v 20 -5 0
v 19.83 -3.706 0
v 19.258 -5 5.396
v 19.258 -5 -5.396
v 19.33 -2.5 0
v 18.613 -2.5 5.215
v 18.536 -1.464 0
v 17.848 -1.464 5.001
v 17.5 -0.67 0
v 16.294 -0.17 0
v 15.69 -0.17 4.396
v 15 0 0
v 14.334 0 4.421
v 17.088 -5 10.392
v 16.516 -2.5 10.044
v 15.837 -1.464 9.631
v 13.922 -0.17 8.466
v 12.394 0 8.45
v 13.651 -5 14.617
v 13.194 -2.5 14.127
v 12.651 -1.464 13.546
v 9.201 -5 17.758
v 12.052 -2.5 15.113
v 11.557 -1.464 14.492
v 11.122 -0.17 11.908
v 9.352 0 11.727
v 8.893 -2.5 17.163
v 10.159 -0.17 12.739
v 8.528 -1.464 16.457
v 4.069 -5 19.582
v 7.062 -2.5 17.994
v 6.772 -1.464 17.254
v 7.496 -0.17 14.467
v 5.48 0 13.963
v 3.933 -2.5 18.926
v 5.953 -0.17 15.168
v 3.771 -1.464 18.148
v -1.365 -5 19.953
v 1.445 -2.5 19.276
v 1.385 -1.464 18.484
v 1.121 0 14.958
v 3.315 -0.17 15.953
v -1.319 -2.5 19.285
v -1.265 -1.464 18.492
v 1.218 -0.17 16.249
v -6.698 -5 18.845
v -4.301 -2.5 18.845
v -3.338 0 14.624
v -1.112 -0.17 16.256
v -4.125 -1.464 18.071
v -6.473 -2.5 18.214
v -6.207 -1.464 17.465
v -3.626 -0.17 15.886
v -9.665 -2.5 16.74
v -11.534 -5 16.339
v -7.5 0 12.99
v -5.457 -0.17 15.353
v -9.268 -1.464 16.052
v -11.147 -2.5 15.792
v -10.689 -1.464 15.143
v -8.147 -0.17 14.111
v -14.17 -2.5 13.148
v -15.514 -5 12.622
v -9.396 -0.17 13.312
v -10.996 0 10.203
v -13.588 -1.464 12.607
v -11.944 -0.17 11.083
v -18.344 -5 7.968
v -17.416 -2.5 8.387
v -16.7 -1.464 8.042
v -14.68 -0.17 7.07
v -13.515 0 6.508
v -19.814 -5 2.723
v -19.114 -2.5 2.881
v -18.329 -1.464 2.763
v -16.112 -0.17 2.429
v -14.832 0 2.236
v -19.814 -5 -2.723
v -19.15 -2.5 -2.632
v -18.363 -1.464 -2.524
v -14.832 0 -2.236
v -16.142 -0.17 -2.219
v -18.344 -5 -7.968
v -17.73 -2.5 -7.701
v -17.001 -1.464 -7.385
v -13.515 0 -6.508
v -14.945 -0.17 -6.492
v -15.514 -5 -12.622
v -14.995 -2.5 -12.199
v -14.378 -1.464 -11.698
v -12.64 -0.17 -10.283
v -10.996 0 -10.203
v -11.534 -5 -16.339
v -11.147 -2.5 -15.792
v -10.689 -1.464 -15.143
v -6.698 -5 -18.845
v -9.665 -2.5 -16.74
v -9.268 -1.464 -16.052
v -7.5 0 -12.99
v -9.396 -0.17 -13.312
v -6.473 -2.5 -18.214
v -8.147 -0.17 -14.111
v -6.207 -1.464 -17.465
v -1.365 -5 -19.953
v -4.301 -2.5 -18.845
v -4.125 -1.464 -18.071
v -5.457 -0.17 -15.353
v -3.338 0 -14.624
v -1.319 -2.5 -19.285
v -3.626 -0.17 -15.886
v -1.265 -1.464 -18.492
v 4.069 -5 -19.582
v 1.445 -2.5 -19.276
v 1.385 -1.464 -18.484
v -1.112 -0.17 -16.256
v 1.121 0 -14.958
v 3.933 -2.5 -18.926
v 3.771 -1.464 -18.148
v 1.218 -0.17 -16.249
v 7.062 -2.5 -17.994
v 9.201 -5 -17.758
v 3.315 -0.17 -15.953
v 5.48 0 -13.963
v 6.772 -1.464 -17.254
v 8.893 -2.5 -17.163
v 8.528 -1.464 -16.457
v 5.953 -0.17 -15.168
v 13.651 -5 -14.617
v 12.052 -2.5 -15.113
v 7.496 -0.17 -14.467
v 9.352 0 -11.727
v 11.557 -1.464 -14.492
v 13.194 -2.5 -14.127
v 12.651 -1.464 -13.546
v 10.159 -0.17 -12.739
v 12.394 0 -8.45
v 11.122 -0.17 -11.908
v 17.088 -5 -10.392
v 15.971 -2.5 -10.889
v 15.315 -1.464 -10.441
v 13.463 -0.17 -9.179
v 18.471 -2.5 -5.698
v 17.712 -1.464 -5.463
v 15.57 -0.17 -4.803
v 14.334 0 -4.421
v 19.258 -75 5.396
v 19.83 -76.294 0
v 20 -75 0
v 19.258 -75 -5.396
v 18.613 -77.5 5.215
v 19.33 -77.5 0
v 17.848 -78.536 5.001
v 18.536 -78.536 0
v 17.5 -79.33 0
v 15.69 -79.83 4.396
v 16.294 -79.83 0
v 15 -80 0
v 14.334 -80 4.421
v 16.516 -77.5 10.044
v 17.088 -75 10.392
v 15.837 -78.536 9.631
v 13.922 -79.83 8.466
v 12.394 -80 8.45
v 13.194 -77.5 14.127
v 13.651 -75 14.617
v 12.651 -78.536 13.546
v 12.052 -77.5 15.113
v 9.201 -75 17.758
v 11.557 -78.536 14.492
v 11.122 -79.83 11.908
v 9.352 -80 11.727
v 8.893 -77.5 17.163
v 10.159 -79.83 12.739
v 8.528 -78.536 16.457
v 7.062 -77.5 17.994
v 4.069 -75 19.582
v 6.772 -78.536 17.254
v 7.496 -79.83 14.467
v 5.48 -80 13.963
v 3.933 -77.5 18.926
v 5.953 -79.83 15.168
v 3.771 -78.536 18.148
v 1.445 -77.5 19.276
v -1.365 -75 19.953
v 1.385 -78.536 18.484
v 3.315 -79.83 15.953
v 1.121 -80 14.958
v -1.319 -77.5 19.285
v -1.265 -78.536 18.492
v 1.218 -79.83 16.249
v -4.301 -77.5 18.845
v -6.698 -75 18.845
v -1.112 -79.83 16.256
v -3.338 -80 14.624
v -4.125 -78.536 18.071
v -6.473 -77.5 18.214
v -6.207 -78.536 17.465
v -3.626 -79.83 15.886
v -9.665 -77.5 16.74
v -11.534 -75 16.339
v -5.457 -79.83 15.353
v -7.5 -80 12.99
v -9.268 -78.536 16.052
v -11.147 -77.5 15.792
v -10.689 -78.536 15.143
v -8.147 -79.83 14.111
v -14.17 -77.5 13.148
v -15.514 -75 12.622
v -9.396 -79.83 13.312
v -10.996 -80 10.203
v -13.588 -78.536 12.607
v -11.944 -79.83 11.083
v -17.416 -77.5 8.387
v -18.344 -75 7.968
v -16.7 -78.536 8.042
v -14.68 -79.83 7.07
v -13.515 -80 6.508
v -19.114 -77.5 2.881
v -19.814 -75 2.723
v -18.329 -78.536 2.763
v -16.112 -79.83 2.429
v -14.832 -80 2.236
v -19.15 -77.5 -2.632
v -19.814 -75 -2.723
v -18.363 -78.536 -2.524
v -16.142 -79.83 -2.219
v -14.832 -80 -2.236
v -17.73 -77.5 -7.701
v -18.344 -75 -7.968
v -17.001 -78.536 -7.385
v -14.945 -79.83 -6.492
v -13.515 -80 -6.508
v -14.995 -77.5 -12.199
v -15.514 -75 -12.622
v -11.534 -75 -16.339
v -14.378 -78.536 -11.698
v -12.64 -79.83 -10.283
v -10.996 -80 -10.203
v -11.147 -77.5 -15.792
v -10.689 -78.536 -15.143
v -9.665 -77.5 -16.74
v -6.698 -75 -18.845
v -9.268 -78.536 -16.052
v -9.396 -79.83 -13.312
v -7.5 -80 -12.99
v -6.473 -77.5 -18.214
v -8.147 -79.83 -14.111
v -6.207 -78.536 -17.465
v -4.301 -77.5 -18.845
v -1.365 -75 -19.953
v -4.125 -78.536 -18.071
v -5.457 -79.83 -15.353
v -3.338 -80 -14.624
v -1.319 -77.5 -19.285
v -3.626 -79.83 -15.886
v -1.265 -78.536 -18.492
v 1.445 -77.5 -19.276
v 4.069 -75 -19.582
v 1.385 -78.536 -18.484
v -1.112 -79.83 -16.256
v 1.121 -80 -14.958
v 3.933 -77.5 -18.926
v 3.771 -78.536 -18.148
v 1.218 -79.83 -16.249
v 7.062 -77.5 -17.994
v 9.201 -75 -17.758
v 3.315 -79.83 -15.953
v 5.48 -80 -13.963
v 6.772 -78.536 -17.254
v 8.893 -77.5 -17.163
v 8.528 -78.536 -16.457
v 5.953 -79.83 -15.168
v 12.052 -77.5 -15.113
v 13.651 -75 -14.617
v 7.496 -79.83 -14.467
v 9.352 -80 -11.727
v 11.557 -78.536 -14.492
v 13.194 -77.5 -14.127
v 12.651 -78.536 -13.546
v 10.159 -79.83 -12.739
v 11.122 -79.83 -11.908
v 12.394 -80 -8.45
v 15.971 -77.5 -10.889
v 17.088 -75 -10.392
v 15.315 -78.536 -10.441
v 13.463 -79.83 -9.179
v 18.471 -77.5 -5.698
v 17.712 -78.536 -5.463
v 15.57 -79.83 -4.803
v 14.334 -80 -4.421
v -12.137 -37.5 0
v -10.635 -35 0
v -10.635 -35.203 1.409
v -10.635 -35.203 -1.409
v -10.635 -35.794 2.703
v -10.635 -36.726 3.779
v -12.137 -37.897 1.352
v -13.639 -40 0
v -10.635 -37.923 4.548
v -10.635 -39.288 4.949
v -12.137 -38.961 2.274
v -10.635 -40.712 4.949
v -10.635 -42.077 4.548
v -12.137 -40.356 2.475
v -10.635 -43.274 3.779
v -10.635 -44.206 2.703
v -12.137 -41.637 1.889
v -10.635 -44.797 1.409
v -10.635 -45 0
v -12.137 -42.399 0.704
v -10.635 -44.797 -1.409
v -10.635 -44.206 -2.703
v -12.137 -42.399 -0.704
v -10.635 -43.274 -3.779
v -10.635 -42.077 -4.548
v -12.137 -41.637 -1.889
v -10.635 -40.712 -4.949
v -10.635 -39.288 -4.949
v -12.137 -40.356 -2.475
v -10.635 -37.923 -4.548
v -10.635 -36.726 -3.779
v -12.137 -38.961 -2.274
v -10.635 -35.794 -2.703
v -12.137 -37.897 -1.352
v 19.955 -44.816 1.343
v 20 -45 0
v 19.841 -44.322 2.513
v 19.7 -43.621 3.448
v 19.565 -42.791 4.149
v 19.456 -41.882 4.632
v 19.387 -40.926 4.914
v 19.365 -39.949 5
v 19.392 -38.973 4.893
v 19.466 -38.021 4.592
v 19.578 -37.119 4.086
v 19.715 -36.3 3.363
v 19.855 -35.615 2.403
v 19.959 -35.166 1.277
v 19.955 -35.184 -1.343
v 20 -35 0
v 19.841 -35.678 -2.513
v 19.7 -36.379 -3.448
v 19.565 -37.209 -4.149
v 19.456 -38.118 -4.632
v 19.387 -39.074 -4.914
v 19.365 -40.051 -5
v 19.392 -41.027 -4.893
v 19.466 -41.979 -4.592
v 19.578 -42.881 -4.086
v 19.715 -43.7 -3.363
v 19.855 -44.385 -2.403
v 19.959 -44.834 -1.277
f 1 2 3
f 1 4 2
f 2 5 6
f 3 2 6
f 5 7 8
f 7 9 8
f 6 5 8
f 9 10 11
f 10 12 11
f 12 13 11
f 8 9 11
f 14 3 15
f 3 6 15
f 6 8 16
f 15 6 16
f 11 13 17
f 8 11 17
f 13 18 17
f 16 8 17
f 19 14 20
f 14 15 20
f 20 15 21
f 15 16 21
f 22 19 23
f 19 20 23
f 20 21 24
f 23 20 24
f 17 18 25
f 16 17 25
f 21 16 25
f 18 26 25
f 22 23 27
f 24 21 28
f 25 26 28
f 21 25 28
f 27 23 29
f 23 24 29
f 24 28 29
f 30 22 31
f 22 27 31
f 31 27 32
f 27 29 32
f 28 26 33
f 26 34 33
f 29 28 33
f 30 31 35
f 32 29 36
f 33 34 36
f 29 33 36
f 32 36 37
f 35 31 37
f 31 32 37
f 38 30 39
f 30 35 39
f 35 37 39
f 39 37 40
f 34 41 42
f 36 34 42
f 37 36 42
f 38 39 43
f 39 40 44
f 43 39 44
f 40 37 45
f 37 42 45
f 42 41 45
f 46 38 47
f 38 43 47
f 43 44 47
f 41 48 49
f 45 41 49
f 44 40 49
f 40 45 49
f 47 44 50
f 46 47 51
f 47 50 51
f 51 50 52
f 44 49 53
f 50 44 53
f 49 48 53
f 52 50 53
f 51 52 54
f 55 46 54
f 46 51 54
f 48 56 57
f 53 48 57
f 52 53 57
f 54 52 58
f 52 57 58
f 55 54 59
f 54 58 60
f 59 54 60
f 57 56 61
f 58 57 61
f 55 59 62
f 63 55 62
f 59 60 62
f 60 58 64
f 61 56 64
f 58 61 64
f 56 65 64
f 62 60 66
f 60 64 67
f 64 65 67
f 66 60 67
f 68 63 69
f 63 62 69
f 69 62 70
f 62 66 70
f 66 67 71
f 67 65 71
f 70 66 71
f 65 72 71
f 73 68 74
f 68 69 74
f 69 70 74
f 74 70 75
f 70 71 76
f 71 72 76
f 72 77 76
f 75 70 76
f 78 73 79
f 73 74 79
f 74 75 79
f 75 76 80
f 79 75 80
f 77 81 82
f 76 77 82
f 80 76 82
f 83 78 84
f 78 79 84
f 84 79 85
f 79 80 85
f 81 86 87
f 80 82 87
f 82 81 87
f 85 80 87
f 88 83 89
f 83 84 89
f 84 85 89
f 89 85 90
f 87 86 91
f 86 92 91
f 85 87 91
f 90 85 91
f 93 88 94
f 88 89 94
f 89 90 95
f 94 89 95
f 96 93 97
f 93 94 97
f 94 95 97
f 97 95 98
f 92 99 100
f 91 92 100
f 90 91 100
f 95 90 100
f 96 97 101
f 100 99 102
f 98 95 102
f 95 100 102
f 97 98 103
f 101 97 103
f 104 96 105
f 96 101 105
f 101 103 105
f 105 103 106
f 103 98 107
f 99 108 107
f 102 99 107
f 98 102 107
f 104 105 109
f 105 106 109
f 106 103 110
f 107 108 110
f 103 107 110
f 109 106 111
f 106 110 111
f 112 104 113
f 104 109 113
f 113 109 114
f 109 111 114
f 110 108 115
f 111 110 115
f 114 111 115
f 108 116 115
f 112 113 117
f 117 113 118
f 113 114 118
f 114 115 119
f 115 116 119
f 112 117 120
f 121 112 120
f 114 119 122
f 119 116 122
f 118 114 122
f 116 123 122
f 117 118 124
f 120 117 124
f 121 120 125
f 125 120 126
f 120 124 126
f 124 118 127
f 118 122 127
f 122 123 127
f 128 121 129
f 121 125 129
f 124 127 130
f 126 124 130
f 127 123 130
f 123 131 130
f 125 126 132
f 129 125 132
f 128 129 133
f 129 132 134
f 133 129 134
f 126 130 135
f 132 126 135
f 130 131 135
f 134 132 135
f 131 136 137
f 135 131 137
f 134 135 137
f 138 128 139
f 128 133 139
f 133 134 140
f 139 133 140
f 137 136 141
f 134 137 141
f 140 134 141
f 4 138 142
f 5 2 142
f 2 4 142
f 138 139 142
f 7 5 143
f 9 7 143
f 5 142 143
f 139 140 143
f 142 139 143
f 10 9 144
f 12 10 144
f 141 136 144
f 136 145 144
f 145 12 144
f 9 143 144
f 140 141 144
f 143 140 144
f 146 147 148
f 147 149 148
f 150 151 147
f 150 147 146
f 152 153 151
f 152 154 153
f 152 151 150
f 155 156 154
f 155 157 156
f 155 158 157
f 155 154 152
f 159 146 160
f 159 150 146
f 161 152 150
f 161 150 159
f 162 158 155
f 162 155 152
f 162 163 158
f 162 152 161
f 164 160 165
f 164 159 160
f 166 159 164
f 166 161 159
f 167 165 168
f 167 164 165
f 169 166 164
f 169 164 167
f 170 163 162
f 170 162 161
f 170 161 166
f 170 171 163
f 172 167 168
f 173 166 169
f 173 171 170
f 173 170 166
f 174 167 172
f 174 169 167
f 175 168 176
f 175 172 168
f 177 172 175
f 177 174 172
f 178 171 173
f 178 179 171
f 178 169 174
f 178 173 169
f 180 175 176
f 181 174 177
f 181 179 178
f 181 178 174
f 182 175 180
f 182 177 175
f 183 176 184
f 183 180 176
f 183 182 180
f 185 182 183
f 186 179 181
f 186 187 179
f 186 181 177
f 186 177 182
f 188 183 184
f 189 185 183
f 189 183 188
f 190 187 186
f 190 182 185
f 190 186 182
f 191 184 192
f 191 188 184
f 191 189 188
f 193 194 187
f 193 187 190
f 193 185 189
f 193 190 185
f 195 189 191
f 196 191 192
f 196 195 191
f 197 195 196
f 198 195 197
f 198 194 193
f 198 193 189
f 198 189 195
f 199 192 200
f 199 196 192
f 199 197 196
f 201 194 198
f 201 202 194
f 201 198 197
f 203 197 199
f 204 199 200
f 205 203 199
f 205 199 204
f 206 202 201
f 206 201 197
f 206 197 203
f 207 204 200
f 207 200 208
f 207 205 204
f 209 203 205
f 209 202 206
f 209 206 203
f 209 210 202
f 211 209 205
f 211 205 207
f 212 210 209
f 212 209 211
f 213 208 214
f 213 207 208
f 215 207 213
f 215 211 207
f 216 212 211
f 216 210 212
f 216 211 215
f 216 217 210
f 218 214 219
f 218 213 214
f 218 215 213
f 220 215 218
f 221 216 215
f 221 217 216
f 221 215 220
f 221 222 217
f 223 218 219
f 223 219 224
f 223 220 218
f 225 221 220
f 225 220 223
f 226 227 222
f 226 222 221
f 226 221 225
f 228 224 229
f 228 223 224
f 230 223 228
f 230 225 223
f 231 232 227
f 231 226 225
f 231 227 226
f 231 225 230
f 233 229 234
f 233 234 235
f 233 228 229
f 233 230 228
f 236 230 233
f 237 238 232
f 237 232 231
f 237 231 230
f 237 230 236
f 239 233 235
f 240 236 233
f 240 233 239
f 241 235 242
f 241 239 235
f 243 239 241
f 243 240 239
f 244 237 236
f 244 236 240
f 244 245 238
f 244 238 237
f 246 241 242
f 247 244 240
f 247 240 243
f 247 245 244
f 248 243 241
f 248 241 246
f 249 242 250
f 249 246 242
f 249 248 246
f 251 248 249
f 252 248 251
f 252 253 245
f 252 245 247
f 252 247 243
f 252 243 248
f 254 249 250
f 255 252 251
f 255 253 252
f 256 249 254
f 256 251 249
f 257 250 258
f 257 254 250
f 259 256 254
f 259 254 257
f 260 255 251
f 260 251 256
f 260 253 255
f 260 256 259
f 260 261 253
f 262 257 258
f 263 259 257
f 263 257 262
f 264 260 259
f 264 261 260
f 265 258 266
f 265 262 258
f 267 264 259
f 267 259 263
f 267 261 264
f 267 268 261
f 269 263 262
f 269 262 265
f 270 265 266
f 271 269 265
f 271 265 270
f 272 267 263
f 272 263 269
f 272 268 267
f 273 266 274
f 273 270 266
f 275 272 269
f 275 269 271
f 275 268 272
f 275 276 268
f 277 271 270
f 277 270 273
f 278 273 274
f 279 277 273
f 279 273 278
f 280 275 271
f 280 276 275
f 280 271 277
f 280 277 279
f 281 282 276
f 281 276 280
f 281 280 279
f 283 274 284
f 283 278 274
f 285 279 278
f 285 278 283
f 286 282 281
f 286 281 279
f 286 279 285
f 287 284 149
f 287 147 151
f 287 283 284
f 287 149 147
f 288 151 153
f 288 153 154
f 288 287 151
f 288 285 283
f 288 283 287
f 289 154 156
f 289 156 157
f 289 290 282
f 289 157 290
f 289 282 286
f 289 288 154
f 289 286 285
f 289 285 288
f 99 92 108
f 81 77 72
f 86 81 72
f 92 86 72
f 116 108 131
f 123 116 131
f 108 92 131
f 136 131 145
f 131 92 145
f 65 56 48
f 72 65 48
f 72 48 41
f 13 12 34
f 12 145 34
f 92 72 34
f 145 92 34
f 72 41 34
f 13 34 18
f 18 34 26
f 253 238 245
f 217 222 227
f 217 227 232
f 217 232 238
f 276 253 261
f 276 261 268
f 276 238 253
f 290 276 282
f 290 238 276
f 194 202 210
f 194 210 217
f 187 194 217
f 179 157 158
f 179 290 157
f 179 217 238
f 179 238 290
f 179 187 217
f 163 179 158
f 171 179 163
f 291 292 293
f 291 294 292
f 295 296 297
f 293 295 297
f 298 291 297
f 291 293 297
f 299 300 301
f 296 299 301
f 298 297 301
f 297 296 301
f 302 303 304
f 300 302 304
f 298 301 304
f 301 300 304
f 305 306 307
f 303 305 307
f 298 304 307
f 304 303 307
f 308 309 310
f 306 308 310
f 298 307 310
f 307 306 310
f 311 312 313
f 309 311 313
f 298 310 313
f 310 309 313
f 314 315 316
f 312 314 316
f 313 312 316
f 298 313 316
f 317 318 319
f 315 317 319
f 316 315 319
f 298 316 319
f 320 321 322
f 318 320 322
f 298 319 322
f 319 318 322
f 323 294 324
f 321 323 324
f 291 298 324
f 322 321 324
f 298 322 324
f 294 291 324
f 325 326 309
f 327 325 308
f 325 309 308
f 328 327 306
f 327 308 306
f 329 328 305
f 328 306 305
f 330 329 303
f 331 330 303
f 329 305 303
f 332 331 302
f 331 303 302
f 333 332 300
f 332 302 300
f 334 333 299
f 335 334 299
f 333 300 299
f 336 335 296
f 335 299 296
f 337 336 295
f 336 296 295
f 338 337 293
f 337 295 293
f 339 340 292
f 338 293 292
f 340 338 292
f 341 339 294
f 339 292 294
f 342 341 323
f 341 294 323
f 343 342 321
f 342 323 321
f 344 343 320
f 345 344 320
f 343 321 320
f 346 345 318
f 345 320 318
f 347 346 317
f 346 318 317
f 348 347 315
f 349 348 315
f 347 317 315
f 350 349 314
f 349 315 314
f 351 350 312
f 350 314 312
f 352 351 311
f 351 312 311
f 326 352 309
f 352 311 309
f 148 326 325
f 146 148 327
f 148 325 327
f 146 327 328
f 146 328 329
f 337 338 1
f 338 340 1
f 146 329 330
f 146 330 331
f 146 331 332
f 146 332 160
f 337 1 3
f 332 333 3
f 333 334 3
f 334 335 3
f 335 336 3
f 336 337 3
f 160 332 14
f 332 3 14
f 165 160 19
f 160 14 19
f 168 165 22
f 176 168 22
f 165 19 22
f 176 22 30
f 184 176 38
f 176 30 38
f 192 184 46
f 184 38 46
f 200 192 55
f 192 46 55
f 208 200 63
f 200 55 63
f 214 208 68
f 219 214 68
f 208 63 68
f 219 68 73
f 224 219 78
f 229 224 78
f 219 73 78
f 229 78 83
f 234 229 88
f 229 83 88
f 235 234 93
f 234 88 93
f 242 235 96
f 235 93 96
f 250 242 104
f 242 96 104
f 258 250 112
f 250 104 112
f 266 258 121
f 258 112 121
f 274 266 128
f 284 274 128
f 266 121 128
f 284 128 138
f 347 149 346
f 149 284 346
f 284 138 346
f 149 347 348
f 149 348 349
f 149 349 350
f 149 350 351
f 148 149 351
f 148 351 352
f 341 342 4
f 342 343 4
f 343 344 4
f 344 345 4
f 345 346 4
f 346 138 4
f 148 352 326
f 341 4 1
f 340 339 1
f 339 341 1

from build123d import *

# Parameters (mm, degrees)
F0_R     = 20
F1_DEPTH = 80
F4_D     = 10
F4_DEPTH = 30
F4_START = 0.6350834
F4_TIP   = 3.0043030951
F5_R     = 5
F6_R     = 5


with BuildPart() as f1:
    # F0 (on Front) → F1 (new body)
    with BuildSketch(Plane.XZ):
        Circle(F0_R)
    extrude(amount=F1_DEPTH)

    # F4
    # its depths count from where the whole tool has entered the part; down to there all is cleared
    with Locations(Plane.YZ.offset(20).offset(-F4_START)):
        with Locations((-40, 0)):
            Hole(F4_D / 2, depth=F4_DEPTH)
            with Locations((0, 0, -(F4_DEPTH + F4_TIP / 2))):  # 118° drill point
                Cone(0, F4_D / 2, F4_TIP, mode=Mode.SUBTRACT)

    # F5
    f5_edges = [f1.edges().sort_by_distance(p)[0] for p in [
        (-20, 0, 0),
    ]]
    fillet(f5_edges, radius=F5_R)

    # F6
    f6_edges = [f1.edges().sort_by_distance(p)[0] for p in [
        (-20, -80, 0),
    ]]
    fillet(f6_edges, radius=F6_R)


solid = f1.part
